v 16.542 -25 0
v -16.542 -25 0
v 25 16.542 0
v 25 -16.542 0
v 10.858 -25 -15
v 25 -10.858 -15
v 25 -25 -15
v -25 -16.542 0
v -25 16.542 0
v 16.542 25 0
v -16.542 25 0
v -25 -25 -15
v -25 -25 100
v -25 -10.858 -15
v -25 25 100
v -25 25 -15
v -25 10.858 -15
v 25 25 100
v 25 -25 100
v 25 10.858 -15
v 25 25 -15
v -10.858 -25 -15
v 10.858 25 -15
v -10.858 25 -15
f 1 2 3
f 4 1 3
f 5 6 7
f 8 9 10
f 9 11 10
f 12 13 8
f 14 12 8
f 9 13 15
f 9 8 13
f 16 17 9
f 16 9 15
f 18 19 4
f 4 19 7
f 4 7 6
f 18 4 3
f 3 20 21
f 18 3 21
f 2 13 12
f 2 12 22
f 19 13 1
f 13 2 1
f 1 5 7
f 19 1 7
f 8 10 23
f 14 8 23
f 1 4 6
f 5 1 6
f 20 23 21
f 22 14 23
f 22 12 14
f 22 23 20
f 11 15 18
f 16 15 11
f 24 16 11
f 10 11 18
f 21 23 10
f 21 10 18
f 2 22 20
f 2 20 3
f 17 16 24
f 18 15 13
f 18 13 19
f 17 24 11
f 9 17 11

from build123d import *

# Parameters (mm, degrees)
F0_W     = 50
F0_H     = 50
F1_DEPTH = 100
F4_DEPTH = 50
F5_W     = 150
F5_H     = 150
F5_W_2   = 50
F5_H_2   = 50
F6_DEPTH = 15


with BuildPart() as f1:
    # F0 (on Top) → F1 (new body)
    with BuildSketch(Plane.XY):
        Rectangle(F0_W, F0_H)
    extrude(amount=F1_DEPTH)

    # F3 (on 3pt) → F4 (join, symmetric)
    with BuildSketch(Plane(origin=(0, 0, 0), x_dir=(0.7071067812, -0.7071067812, 0), z_dir=(-0.7071067812, -0.7071067812, 0))):
        Polygon((-29.3745769458, 0), (-35.3553390593, 0), (-35.3553390593, -15), (-25.3553390593, -15), align=None)
        Polygon((35.3553390593, -15), (35.3553390593, 0), (29.3745769458, 0), (25.3553390593, -15), align=None)
        Polygon((5.9807621135, 0), (-5.9807621135, 0), (-10, -15), (10, -15), align=None)
    extrude(amount=F4_DEPTH, both=True)

    # F5 (on face) → F6 (cut, through all)
    with BuildSketch(Plane(origin=(0, 0, 0), x_dir=(1, 0, 0), z_dir=(0, 0, -1))):
        Rectangle(F5_W, F5_H)
        Rectangle(F5_W_2, F5_H_2, mode=Mode.SUBTRACT)
    extrude(amount=F6_DEPTH, mode=Mode.SUBTRACT)


solid = f1.part
